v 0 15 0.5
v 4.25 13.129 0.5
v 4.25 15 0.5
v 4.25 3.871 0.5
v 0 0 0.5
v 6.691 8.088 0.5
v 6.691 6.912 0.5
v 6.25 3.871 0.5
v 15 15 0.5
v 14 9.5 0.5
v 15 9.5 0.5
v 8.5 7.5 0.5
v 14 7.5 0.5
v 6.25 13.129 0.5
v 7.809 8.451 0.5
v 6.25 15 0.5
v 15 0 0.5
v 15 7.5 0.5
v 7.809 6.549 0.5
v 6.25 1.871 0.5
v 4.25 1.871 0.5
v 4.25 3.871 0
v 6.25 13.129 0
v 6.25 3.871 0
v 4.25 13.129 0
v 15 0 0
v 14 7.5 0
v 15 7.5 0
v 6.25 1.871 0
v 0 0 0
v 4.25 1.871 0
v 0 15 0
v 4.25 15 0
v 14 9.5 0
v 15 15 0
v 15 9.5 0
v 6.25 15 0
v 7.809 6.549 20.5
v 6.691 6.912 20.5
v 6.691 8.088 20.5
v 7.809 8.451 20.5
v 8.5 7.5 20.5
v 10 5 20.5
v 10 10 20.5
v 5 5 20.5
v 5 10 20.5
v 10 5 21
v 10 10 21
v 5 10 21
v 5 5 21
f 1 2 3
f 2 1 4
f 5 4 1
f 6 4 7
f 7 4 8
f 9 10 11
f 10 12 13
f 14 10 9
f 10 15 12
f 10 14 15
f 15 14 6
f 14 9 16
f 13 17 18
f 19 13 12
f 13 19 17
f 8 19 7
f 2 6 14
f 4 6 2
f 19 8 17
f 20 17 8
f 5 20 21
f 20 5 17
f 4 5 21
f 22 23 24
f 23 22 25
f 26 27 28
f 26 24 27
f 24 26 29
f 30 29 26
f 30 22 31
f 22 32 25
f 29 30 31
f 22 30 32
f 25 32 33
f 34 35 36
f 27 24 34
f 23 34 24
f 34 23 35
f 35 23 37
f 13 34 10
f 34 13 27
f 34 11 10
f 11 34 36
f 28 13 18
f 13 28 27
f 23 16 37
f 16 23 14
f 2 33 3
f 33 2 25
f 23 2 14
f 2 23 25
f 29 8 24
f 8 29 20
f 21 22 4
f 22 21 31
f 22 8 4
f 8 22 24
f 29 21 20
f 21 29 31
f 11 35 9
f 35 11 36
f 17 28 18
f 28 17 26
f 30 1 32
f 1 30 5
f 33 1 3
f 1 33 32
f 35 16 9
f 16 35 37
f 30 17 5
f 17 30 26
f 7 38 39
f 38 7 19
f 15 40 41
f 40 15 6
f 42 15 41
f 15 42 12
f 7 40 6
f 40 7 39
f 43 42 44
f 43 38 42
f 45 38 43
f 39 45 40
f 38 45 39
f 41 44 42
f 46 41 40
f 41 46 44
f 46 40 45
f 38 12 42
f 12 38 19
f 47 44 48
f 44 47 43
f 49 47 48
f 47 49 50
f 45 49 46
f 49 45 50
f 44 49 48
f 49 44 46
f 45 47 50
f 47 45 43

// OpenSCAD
// Define the dimensions of the tripod
base_width = 15;
base_depth = 15;
pole_height = 20;
pole_radius = 1;
platform_width = 5;
platform_depth = 5;
platform_thickness = 0.5;
leg_width = 2;
leg_depth = 2;
leg_height = 10;
num_legs = 3; // specify the number of legs

// Create the tripod module with multiple legs
module tripod() {
    // Create the base
    difference() {
        cube([base_width, base_depth, platform_thickness]);
        for (i = [0:num_legs-1]) {
            angle = i * 360 / num_legs;
            translate([base_width/2 + cos(angle)*((base_width-leg_width)/2), base_depth/2 + sin(angle)*((base_depth-leg_depth)/2), 0]) cube([leg_width, leg_depth, platform_thickness]);
        }
    }
    
    // Create the pole
    translate([base_width/2, base_depth/2, platform_thickness]) cylinder(r=pole_radius, h=pole_height);
    
    // Create the platform
    translate([base_width/2 - platform_width/2, base_depth/2 - platform_depth/2, platform_thickness + pole_height]) cube([platform_width, platform_depth, platform_thickness]);
}

// Call the tripod module to create the tripod
tripod();
